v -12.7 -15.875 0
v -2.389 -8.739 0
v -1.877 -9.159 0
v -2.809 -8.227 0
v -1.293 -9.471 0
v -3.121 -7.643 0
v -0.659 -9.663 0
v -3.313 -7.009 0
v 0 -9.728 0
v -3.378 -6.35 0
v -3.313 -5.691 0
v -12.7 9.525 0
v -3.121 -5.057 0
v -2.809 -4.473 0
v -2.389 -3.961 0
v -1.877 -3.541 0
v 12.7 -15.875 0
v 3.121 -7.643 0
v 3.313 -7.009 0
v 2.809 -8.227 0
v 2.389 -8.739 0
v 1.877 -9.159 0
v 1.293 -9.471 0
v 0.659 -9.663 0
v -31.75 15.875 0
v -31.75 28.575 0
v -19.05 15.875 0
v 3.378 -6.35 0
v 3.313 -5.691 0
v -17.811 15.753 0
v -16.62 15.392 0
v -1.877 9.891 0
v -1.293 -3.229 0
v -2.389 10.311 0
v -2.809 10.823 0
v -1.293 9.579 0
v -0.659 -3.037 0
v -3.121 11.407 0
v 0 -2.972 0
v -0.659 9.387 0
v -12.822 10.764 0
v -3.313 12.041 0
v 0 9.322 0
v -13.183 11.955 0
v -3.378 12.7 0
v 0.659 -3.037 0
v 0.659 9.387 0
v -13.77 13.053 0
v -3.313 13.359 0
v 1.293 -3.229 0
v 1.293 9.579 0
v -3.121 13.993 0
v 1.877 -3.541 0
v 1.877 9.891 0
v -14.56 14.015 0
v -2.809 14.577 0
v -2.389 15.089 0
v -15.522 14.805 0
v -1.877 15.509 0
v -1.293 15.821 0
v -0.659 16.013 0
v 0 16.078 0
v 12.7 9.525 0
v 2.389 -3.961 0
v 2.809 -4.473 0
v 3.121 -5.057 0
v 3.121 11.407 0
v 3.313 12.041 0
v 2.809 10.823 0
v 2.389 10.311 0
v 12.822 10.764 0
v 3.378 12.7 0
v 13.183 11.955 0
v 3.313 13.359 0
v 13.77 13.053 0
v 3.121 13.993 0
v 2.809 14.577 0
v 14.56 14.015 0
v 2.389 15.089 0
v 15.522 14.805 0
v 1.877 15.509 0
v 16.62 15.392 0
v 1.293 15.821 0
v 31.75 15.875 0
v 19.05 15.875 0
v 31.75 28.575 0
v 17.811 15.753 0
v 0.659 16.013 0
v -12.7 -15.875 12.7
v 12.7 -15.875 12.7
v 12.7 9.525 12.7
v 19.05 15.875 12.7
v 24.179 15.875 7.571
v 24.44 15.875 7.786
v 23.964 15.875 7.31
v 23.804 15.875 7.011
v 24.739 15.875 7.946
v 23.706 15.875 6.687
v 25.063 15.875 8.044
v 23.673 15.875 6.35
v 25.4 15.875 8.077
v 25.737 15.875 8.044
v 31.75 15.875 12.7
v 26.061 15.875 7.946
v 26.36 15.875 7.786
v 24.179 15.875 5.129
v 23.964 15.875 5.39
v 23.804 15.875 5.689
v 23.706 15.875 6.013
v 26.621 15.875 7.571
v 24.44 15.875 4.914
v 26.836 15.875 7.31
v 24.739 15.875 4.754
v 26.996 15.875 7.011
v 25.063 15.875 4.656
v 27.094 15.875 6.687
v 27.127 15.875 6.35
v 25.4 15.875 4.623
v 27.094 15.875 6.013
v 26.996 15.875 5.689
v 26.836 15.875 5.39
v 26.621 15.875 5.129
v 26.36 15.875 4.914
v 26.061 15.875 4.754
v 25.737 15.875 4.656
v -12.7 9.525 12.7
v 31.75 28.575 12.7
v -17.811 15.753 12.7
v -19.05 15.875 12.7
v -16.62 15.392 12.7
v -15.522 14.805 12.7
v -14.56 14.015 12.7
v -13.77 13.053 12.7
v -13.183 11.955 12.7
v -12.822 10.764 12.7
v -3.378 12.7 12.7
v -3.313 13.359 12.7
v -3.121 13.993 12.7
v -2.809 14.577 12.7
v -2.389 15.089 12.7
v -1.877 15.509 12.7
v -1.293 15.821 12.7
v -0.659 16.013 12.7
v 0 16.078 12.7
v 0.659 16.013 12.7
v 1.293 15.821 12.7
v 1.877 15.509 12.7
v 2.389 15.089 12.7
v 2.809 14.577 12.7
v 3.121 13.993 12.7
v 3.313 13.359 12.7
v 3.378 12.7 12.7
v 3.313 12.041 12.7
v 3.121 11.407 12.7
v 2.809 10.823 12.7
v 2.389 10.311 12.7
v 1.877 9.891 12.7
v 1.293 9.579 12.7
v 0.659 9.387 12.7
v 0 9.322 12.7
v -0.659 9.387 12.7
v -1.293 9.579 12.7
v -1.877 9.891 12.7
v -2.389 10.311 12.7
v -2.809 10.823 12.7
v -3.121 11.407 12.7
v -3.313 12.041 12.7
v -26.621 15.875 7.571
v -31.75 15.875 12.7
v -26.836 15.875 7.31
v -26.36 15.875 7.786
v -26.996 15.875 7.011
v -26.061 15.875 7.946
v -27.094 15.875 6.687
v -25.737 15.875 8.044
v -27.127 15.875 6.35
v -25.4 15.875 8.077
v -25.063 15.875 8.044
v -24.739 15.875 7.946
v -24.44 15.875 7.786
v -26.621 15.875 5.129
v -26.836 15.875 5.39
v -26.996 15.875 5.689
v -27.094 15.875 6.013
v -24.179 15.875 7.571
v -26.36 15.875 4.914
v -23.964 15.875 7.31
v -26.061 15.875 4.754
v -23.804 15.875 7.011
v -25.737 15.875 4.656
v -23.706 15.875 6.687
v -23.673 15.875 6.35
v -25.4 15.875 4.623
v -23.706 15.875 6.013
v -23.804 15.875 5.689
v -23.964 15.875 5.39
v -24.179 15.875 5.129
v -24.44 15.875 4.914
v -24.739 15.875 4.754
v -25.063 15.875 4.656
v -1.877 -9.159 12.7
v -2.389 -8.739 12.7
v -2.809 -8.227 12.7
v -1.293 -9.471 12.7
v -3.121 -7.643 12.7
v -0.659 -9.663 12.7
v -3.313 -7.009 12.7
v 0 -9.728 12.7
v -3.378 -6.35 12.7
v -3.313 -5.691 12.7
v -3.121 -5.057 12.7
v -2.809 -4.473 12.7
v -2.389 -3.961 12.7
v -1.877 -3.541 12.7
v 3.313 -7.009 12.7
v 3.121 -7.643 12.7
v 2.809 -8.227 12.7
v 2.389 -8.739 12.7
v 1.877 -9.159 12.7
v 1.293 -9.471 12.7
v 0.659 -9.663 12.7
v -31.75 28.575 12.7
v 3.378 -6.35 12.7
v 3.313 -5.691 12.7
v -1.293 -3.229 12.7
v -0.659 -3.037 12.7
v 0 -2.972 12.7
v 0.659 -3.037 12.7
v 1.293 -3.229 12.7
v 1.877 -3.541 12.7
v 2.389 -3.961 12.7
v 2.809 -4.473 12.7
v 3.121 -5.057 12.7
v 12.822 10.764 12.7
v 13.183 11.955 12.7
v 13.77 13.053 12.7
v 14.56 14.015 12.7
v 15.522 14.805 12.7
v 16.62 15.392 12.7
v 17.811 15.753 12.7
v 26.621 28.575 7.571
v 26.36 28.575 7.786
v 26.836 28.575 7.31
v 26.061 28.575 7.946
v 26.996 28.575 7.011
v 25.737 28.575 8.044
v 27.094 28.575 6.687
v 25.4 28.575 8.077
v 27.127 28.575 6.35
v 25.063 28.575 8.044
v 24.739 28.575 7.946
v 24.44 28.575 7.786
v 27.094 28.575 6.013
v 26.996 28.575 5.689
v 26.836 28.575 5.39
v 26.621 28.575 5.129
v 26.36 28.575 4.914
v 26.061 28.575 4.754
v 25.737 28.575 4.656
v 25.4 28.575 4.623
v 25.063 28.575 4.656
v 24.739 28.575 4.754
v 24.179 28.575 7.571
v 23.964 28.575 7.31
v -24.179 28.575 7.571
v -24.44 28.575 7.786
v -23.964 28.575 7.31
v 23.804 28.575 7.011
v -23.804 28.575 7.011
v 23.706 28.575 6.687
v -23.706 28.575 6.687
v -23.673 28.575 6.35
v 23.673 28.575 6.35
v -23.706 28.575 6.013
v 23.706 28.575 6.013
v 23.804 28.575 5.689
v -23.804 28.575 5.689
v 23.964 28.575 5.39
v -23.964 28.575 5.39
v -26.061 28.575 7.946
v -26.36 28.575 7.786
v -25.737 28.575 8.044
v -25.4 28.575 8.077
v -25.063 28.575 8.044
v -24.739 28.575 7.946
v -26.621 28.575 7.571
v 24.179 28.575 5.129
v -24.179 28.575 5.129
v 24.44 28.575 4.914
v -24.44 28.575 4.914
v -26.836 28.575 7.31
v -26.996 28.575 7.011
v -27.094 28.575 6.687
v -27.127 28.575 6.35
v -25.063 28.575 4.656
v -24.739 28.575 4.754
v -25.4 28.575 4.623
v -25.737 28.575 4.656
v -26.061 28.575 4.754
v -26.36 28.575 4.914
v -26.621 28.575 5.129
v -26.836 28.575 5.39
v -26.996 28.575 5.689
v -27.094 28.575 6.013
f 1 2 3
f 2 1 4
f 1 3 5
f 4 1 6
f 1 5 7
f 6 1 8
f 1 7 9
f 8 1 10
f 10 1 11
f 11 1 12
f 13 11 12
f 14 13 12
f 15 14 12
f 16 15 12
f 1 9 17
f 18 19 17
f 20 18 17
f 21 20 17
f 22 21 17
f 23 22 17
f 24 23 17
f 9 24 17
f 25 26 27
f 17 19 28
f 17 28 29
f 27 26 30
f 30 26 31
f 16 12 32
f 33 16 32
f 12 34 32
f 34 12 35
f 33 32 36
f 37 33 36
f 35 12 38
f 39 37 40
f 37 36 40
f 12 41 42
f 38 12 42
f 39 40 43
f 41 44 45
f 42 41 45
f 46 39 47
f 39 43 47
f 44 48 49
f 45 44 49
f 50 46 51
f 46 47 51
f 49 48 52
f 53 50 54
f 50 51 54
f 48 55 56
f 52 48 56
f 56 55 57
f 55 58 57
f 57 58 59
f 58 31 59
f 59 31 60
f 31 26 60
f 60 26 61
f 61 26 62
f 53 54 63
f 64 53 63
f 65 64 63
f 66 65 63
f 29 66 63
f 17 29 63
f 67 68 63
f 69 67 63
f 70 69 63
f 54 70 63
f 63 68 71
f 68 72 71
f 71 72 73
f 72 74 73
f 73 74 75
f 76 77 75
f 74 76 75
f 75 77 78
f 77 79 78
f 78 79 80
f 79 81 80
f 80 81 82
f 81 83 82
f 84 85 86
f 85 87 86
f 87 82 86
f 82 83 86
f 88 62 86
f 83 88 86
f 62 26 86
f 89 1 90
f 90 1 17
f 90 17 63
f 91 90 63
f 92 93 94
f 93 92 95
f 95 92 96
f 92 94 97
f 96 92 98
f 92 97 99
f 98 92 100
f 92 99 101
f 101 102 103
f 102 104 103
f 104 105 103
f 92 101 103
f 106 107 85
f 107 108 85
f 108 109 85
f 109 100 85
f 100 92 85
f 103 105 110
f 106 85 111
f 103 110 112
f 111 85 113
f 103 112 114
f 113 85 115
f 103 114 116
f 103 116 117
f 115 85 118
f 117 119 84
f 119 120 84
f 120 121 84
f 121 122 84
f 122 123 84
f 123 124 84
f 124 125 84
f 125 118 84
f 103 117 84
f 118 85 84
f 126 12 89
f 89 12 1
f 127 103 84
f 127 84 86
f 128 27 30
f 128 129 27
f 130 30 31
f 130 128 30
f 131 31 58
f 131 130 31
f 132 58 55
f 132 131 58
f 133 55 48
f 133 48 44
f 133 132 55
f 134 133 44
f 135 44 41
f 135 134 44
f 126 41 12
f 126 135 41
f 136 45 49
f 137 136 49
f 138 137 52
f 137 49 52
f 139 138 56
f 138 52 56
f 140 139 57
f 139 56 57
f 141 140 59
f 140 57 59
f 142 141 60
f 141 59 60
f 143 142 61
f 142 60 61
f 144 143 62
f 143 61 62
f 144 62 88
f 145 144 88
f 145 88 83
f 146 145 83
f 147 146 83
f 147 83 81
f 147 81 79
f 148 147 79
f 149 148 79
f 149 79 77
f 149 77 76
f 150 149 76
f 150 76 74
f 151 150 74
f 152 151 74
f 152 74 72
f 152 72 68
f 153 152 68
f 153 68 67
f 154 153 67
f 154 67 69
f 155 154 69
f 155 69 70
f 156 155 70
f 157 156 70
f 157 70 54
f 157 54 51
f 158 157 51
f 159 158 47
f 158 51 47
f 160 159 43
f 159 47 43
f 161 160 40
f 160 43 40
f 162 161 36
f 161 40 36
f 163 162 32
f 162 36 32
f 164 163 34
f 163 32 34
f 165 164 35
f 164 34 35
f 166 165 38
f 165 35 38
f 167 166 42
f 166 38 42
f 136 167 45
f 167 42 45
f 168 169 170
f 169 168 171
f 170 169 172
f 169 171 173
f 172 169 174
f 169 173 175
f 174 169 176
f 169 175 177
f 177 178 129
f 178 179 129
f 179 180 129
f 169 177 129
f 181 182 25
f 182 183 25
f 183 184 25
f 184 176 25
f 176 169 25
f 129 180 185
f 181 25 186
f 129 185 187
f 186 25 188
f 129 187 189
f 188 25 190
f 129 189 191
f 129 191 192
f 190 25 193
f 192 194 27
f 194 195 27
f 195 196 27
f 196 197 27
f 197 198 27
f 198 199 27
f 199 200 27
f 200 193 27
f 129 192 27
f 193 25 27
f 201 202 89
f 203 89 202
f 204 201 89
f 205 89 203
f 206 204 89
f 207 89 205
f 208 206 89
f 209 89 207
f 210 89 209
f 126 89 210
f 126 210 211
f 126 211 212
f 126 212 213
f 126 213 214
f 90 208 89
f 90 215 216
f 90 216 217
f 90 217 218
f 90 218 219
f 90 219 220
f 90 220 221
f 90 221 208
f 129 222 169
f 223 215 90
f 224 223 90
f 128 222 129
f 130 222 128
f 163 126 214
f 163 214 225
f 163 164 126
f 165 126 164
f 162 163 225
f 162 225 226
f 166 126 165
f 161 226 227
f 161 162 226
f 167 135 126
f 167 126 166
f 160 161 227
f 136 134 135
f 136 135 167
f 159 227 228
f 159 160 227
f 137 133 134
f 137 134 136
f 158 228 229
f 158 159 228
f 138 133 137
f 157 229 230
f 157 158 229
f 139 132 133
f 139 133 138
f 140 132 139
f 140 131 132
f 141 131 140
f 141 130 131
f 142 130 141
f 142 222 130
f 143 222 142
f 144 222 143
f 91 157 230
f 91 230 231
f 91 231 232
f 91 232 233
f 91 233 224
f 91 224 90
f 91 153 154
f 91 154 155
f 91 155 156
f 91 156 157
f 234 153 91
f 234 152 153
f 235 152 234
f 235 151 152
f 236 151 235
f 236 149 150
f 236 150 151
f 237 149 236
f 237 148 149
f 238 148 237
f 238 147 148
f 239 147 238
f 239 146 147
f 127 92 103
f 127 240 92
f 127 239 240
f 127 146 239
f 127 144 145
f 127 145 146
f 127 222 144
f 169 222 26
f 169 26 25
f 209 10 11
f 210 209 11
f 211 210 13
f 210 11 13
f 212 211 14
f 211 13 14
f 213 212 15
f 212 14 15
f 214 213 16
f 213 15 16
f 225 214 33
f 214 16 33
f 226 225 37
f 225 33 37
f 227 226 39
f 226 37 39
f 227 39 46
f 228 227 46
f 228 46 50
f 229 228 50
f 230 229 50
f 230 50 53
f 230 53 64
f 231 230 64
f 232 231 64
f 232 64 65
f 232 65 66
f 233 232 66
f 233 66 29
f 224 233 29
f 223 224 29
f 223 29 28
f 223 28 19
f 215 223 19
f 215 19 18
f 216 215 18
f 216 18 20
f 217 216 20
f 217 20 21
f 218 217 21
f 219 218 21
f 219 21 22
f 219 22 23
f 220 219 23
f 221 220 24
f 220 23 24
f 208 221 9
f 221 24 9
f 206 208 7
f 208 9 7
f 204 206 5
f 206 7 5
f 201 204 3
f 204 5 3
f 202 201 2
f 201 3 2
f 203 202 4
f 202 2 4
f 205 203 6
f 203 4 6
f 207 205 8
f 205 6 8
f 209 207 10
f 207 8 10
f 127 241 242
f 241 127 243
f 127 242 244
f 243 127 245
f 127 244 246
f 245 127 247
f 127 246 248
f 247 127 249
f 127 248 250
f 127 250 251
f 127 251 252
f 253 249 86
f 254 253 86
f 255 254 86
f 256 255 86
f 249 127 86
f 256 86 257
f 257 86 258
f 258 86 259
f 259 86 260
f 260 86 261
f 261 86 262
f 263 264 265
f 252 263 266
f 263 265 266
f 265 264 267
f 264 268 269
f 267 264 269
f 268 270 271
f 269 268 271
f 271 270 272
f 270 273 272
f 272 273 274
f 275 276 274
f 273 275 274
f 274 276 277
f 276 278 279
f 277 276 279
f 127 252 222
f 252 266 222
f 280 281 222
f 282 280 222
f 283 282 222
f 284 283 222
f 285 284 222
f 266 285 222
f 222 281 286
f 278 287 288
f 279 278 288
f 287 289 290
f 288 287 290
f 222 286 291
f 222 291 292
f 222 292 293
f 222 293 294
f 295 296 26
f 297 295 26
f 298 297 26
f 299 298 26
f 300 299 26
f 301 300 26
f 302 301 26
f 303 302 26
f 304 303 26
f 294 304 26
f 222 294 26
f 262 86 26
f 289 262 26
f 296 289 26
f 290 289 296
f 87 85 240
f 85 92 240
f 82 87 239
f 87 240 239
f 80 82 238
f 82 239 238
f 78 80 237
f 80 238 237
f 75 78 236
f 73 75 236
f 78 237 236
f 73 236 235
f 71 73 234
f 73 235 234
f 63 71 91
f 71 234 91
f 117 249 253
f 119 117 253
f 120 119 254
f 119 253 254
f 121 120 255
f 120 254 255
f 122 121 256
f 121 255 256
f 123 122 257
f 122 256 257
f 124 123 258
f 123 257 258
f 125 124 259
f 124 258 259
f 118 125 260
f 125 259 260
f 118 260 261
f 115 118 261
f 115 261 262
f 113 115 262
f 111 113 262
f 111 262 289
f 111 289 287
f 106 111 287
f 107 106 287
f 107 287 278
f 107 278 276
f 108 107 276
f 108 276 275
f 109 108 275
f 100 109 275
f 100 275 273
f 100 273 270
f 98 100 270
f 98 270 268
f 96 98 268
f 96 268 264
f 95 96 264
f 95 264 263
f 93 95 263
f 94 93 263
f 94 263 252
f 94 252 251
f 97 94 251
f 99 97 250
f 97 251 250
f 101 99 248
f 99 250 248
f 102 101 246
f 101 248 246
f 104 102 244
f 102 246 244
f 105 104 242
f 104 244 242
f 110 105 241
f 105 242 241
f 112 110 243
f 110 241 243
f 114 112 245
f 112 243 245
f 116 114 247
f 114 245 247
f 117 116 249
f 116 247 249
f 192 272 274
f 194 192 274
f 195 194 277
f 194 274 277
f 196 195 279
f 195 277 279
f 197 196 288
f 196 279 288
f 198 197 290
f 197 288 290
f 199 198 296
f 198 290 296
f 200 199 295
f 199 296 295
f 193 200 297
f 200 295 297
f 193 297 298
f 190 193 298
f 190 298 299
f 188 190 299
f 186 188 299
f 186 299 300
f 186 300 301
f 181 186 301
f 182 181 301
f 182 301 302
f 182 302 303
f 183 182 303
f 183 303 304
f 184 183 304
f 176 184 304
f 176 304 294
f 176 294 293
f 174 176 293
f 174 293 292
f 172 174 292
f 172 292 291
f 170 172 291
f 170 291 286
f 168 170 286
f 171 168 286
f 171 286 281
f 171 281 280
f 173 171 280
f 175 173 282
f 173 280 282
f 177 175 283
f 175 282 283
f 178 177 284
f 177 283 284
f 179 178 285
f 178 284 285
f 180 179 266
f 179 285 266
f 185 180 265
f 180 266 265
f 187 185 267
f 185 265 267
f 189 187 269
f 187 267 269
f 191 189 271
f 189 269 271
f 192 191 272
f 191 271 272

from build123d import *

# Parameters (mm, degrees)
BOSS_EXTRUDE1_DEPTH       = 12.7
FILLET1_R                 = 6.35
F_1_4_CLEARANCE_HOLE1_D   = 6.7564
TAP_DRILL_FOR_8_32_TAP1_D = 3.4544


with BuildPart() as part:
    # Sketch1 → Boss-Extrude1 (new body)
    with BuildSketch(Plane.XY):
        Polygon((12.7, 15.875), (31.75, 15.875), (31.75, 28.575), (-31.75, 28.575), (-31.75, 15.875), (-12.7, 15.875), (-12.7, -15.875), (12.7, -15.875), align=None)
    extrude(amount=BOSS_EXTRUDE1_DEPTH)

    # Fillet1
    fillet1_edges = [part.edges().sort_by_distance(p)[0] for p in [
        (-12.7, 15.875, 6.35),
        (12.7, 15.875, 6.35),
    ]]
    fillet(fillet1_edges, radius=FILLET1_R)

    # 1/4 Clearance Hole1 (through all)
    with Locations(Plane.XY.offset(12.7)):
        with Locations((0, -6.35), (0, 12.7)):
            Hole(F_1_4_CLEARANCE_HOLE1_D / 2)

    # Tap Drill for #8-32 Tap1 (through all)
    with Locations(Plane(origin=(0, 15.875, 0), x_dir=(-1, 0, 0), z_dir=(0, -1, 0))):
        with Locations((-25.4, -6.35), (25.4, -6.35)):
            Hole(TAP_DRILL_FOR_8_32_TAP1_D / 2)


solid = part.part
